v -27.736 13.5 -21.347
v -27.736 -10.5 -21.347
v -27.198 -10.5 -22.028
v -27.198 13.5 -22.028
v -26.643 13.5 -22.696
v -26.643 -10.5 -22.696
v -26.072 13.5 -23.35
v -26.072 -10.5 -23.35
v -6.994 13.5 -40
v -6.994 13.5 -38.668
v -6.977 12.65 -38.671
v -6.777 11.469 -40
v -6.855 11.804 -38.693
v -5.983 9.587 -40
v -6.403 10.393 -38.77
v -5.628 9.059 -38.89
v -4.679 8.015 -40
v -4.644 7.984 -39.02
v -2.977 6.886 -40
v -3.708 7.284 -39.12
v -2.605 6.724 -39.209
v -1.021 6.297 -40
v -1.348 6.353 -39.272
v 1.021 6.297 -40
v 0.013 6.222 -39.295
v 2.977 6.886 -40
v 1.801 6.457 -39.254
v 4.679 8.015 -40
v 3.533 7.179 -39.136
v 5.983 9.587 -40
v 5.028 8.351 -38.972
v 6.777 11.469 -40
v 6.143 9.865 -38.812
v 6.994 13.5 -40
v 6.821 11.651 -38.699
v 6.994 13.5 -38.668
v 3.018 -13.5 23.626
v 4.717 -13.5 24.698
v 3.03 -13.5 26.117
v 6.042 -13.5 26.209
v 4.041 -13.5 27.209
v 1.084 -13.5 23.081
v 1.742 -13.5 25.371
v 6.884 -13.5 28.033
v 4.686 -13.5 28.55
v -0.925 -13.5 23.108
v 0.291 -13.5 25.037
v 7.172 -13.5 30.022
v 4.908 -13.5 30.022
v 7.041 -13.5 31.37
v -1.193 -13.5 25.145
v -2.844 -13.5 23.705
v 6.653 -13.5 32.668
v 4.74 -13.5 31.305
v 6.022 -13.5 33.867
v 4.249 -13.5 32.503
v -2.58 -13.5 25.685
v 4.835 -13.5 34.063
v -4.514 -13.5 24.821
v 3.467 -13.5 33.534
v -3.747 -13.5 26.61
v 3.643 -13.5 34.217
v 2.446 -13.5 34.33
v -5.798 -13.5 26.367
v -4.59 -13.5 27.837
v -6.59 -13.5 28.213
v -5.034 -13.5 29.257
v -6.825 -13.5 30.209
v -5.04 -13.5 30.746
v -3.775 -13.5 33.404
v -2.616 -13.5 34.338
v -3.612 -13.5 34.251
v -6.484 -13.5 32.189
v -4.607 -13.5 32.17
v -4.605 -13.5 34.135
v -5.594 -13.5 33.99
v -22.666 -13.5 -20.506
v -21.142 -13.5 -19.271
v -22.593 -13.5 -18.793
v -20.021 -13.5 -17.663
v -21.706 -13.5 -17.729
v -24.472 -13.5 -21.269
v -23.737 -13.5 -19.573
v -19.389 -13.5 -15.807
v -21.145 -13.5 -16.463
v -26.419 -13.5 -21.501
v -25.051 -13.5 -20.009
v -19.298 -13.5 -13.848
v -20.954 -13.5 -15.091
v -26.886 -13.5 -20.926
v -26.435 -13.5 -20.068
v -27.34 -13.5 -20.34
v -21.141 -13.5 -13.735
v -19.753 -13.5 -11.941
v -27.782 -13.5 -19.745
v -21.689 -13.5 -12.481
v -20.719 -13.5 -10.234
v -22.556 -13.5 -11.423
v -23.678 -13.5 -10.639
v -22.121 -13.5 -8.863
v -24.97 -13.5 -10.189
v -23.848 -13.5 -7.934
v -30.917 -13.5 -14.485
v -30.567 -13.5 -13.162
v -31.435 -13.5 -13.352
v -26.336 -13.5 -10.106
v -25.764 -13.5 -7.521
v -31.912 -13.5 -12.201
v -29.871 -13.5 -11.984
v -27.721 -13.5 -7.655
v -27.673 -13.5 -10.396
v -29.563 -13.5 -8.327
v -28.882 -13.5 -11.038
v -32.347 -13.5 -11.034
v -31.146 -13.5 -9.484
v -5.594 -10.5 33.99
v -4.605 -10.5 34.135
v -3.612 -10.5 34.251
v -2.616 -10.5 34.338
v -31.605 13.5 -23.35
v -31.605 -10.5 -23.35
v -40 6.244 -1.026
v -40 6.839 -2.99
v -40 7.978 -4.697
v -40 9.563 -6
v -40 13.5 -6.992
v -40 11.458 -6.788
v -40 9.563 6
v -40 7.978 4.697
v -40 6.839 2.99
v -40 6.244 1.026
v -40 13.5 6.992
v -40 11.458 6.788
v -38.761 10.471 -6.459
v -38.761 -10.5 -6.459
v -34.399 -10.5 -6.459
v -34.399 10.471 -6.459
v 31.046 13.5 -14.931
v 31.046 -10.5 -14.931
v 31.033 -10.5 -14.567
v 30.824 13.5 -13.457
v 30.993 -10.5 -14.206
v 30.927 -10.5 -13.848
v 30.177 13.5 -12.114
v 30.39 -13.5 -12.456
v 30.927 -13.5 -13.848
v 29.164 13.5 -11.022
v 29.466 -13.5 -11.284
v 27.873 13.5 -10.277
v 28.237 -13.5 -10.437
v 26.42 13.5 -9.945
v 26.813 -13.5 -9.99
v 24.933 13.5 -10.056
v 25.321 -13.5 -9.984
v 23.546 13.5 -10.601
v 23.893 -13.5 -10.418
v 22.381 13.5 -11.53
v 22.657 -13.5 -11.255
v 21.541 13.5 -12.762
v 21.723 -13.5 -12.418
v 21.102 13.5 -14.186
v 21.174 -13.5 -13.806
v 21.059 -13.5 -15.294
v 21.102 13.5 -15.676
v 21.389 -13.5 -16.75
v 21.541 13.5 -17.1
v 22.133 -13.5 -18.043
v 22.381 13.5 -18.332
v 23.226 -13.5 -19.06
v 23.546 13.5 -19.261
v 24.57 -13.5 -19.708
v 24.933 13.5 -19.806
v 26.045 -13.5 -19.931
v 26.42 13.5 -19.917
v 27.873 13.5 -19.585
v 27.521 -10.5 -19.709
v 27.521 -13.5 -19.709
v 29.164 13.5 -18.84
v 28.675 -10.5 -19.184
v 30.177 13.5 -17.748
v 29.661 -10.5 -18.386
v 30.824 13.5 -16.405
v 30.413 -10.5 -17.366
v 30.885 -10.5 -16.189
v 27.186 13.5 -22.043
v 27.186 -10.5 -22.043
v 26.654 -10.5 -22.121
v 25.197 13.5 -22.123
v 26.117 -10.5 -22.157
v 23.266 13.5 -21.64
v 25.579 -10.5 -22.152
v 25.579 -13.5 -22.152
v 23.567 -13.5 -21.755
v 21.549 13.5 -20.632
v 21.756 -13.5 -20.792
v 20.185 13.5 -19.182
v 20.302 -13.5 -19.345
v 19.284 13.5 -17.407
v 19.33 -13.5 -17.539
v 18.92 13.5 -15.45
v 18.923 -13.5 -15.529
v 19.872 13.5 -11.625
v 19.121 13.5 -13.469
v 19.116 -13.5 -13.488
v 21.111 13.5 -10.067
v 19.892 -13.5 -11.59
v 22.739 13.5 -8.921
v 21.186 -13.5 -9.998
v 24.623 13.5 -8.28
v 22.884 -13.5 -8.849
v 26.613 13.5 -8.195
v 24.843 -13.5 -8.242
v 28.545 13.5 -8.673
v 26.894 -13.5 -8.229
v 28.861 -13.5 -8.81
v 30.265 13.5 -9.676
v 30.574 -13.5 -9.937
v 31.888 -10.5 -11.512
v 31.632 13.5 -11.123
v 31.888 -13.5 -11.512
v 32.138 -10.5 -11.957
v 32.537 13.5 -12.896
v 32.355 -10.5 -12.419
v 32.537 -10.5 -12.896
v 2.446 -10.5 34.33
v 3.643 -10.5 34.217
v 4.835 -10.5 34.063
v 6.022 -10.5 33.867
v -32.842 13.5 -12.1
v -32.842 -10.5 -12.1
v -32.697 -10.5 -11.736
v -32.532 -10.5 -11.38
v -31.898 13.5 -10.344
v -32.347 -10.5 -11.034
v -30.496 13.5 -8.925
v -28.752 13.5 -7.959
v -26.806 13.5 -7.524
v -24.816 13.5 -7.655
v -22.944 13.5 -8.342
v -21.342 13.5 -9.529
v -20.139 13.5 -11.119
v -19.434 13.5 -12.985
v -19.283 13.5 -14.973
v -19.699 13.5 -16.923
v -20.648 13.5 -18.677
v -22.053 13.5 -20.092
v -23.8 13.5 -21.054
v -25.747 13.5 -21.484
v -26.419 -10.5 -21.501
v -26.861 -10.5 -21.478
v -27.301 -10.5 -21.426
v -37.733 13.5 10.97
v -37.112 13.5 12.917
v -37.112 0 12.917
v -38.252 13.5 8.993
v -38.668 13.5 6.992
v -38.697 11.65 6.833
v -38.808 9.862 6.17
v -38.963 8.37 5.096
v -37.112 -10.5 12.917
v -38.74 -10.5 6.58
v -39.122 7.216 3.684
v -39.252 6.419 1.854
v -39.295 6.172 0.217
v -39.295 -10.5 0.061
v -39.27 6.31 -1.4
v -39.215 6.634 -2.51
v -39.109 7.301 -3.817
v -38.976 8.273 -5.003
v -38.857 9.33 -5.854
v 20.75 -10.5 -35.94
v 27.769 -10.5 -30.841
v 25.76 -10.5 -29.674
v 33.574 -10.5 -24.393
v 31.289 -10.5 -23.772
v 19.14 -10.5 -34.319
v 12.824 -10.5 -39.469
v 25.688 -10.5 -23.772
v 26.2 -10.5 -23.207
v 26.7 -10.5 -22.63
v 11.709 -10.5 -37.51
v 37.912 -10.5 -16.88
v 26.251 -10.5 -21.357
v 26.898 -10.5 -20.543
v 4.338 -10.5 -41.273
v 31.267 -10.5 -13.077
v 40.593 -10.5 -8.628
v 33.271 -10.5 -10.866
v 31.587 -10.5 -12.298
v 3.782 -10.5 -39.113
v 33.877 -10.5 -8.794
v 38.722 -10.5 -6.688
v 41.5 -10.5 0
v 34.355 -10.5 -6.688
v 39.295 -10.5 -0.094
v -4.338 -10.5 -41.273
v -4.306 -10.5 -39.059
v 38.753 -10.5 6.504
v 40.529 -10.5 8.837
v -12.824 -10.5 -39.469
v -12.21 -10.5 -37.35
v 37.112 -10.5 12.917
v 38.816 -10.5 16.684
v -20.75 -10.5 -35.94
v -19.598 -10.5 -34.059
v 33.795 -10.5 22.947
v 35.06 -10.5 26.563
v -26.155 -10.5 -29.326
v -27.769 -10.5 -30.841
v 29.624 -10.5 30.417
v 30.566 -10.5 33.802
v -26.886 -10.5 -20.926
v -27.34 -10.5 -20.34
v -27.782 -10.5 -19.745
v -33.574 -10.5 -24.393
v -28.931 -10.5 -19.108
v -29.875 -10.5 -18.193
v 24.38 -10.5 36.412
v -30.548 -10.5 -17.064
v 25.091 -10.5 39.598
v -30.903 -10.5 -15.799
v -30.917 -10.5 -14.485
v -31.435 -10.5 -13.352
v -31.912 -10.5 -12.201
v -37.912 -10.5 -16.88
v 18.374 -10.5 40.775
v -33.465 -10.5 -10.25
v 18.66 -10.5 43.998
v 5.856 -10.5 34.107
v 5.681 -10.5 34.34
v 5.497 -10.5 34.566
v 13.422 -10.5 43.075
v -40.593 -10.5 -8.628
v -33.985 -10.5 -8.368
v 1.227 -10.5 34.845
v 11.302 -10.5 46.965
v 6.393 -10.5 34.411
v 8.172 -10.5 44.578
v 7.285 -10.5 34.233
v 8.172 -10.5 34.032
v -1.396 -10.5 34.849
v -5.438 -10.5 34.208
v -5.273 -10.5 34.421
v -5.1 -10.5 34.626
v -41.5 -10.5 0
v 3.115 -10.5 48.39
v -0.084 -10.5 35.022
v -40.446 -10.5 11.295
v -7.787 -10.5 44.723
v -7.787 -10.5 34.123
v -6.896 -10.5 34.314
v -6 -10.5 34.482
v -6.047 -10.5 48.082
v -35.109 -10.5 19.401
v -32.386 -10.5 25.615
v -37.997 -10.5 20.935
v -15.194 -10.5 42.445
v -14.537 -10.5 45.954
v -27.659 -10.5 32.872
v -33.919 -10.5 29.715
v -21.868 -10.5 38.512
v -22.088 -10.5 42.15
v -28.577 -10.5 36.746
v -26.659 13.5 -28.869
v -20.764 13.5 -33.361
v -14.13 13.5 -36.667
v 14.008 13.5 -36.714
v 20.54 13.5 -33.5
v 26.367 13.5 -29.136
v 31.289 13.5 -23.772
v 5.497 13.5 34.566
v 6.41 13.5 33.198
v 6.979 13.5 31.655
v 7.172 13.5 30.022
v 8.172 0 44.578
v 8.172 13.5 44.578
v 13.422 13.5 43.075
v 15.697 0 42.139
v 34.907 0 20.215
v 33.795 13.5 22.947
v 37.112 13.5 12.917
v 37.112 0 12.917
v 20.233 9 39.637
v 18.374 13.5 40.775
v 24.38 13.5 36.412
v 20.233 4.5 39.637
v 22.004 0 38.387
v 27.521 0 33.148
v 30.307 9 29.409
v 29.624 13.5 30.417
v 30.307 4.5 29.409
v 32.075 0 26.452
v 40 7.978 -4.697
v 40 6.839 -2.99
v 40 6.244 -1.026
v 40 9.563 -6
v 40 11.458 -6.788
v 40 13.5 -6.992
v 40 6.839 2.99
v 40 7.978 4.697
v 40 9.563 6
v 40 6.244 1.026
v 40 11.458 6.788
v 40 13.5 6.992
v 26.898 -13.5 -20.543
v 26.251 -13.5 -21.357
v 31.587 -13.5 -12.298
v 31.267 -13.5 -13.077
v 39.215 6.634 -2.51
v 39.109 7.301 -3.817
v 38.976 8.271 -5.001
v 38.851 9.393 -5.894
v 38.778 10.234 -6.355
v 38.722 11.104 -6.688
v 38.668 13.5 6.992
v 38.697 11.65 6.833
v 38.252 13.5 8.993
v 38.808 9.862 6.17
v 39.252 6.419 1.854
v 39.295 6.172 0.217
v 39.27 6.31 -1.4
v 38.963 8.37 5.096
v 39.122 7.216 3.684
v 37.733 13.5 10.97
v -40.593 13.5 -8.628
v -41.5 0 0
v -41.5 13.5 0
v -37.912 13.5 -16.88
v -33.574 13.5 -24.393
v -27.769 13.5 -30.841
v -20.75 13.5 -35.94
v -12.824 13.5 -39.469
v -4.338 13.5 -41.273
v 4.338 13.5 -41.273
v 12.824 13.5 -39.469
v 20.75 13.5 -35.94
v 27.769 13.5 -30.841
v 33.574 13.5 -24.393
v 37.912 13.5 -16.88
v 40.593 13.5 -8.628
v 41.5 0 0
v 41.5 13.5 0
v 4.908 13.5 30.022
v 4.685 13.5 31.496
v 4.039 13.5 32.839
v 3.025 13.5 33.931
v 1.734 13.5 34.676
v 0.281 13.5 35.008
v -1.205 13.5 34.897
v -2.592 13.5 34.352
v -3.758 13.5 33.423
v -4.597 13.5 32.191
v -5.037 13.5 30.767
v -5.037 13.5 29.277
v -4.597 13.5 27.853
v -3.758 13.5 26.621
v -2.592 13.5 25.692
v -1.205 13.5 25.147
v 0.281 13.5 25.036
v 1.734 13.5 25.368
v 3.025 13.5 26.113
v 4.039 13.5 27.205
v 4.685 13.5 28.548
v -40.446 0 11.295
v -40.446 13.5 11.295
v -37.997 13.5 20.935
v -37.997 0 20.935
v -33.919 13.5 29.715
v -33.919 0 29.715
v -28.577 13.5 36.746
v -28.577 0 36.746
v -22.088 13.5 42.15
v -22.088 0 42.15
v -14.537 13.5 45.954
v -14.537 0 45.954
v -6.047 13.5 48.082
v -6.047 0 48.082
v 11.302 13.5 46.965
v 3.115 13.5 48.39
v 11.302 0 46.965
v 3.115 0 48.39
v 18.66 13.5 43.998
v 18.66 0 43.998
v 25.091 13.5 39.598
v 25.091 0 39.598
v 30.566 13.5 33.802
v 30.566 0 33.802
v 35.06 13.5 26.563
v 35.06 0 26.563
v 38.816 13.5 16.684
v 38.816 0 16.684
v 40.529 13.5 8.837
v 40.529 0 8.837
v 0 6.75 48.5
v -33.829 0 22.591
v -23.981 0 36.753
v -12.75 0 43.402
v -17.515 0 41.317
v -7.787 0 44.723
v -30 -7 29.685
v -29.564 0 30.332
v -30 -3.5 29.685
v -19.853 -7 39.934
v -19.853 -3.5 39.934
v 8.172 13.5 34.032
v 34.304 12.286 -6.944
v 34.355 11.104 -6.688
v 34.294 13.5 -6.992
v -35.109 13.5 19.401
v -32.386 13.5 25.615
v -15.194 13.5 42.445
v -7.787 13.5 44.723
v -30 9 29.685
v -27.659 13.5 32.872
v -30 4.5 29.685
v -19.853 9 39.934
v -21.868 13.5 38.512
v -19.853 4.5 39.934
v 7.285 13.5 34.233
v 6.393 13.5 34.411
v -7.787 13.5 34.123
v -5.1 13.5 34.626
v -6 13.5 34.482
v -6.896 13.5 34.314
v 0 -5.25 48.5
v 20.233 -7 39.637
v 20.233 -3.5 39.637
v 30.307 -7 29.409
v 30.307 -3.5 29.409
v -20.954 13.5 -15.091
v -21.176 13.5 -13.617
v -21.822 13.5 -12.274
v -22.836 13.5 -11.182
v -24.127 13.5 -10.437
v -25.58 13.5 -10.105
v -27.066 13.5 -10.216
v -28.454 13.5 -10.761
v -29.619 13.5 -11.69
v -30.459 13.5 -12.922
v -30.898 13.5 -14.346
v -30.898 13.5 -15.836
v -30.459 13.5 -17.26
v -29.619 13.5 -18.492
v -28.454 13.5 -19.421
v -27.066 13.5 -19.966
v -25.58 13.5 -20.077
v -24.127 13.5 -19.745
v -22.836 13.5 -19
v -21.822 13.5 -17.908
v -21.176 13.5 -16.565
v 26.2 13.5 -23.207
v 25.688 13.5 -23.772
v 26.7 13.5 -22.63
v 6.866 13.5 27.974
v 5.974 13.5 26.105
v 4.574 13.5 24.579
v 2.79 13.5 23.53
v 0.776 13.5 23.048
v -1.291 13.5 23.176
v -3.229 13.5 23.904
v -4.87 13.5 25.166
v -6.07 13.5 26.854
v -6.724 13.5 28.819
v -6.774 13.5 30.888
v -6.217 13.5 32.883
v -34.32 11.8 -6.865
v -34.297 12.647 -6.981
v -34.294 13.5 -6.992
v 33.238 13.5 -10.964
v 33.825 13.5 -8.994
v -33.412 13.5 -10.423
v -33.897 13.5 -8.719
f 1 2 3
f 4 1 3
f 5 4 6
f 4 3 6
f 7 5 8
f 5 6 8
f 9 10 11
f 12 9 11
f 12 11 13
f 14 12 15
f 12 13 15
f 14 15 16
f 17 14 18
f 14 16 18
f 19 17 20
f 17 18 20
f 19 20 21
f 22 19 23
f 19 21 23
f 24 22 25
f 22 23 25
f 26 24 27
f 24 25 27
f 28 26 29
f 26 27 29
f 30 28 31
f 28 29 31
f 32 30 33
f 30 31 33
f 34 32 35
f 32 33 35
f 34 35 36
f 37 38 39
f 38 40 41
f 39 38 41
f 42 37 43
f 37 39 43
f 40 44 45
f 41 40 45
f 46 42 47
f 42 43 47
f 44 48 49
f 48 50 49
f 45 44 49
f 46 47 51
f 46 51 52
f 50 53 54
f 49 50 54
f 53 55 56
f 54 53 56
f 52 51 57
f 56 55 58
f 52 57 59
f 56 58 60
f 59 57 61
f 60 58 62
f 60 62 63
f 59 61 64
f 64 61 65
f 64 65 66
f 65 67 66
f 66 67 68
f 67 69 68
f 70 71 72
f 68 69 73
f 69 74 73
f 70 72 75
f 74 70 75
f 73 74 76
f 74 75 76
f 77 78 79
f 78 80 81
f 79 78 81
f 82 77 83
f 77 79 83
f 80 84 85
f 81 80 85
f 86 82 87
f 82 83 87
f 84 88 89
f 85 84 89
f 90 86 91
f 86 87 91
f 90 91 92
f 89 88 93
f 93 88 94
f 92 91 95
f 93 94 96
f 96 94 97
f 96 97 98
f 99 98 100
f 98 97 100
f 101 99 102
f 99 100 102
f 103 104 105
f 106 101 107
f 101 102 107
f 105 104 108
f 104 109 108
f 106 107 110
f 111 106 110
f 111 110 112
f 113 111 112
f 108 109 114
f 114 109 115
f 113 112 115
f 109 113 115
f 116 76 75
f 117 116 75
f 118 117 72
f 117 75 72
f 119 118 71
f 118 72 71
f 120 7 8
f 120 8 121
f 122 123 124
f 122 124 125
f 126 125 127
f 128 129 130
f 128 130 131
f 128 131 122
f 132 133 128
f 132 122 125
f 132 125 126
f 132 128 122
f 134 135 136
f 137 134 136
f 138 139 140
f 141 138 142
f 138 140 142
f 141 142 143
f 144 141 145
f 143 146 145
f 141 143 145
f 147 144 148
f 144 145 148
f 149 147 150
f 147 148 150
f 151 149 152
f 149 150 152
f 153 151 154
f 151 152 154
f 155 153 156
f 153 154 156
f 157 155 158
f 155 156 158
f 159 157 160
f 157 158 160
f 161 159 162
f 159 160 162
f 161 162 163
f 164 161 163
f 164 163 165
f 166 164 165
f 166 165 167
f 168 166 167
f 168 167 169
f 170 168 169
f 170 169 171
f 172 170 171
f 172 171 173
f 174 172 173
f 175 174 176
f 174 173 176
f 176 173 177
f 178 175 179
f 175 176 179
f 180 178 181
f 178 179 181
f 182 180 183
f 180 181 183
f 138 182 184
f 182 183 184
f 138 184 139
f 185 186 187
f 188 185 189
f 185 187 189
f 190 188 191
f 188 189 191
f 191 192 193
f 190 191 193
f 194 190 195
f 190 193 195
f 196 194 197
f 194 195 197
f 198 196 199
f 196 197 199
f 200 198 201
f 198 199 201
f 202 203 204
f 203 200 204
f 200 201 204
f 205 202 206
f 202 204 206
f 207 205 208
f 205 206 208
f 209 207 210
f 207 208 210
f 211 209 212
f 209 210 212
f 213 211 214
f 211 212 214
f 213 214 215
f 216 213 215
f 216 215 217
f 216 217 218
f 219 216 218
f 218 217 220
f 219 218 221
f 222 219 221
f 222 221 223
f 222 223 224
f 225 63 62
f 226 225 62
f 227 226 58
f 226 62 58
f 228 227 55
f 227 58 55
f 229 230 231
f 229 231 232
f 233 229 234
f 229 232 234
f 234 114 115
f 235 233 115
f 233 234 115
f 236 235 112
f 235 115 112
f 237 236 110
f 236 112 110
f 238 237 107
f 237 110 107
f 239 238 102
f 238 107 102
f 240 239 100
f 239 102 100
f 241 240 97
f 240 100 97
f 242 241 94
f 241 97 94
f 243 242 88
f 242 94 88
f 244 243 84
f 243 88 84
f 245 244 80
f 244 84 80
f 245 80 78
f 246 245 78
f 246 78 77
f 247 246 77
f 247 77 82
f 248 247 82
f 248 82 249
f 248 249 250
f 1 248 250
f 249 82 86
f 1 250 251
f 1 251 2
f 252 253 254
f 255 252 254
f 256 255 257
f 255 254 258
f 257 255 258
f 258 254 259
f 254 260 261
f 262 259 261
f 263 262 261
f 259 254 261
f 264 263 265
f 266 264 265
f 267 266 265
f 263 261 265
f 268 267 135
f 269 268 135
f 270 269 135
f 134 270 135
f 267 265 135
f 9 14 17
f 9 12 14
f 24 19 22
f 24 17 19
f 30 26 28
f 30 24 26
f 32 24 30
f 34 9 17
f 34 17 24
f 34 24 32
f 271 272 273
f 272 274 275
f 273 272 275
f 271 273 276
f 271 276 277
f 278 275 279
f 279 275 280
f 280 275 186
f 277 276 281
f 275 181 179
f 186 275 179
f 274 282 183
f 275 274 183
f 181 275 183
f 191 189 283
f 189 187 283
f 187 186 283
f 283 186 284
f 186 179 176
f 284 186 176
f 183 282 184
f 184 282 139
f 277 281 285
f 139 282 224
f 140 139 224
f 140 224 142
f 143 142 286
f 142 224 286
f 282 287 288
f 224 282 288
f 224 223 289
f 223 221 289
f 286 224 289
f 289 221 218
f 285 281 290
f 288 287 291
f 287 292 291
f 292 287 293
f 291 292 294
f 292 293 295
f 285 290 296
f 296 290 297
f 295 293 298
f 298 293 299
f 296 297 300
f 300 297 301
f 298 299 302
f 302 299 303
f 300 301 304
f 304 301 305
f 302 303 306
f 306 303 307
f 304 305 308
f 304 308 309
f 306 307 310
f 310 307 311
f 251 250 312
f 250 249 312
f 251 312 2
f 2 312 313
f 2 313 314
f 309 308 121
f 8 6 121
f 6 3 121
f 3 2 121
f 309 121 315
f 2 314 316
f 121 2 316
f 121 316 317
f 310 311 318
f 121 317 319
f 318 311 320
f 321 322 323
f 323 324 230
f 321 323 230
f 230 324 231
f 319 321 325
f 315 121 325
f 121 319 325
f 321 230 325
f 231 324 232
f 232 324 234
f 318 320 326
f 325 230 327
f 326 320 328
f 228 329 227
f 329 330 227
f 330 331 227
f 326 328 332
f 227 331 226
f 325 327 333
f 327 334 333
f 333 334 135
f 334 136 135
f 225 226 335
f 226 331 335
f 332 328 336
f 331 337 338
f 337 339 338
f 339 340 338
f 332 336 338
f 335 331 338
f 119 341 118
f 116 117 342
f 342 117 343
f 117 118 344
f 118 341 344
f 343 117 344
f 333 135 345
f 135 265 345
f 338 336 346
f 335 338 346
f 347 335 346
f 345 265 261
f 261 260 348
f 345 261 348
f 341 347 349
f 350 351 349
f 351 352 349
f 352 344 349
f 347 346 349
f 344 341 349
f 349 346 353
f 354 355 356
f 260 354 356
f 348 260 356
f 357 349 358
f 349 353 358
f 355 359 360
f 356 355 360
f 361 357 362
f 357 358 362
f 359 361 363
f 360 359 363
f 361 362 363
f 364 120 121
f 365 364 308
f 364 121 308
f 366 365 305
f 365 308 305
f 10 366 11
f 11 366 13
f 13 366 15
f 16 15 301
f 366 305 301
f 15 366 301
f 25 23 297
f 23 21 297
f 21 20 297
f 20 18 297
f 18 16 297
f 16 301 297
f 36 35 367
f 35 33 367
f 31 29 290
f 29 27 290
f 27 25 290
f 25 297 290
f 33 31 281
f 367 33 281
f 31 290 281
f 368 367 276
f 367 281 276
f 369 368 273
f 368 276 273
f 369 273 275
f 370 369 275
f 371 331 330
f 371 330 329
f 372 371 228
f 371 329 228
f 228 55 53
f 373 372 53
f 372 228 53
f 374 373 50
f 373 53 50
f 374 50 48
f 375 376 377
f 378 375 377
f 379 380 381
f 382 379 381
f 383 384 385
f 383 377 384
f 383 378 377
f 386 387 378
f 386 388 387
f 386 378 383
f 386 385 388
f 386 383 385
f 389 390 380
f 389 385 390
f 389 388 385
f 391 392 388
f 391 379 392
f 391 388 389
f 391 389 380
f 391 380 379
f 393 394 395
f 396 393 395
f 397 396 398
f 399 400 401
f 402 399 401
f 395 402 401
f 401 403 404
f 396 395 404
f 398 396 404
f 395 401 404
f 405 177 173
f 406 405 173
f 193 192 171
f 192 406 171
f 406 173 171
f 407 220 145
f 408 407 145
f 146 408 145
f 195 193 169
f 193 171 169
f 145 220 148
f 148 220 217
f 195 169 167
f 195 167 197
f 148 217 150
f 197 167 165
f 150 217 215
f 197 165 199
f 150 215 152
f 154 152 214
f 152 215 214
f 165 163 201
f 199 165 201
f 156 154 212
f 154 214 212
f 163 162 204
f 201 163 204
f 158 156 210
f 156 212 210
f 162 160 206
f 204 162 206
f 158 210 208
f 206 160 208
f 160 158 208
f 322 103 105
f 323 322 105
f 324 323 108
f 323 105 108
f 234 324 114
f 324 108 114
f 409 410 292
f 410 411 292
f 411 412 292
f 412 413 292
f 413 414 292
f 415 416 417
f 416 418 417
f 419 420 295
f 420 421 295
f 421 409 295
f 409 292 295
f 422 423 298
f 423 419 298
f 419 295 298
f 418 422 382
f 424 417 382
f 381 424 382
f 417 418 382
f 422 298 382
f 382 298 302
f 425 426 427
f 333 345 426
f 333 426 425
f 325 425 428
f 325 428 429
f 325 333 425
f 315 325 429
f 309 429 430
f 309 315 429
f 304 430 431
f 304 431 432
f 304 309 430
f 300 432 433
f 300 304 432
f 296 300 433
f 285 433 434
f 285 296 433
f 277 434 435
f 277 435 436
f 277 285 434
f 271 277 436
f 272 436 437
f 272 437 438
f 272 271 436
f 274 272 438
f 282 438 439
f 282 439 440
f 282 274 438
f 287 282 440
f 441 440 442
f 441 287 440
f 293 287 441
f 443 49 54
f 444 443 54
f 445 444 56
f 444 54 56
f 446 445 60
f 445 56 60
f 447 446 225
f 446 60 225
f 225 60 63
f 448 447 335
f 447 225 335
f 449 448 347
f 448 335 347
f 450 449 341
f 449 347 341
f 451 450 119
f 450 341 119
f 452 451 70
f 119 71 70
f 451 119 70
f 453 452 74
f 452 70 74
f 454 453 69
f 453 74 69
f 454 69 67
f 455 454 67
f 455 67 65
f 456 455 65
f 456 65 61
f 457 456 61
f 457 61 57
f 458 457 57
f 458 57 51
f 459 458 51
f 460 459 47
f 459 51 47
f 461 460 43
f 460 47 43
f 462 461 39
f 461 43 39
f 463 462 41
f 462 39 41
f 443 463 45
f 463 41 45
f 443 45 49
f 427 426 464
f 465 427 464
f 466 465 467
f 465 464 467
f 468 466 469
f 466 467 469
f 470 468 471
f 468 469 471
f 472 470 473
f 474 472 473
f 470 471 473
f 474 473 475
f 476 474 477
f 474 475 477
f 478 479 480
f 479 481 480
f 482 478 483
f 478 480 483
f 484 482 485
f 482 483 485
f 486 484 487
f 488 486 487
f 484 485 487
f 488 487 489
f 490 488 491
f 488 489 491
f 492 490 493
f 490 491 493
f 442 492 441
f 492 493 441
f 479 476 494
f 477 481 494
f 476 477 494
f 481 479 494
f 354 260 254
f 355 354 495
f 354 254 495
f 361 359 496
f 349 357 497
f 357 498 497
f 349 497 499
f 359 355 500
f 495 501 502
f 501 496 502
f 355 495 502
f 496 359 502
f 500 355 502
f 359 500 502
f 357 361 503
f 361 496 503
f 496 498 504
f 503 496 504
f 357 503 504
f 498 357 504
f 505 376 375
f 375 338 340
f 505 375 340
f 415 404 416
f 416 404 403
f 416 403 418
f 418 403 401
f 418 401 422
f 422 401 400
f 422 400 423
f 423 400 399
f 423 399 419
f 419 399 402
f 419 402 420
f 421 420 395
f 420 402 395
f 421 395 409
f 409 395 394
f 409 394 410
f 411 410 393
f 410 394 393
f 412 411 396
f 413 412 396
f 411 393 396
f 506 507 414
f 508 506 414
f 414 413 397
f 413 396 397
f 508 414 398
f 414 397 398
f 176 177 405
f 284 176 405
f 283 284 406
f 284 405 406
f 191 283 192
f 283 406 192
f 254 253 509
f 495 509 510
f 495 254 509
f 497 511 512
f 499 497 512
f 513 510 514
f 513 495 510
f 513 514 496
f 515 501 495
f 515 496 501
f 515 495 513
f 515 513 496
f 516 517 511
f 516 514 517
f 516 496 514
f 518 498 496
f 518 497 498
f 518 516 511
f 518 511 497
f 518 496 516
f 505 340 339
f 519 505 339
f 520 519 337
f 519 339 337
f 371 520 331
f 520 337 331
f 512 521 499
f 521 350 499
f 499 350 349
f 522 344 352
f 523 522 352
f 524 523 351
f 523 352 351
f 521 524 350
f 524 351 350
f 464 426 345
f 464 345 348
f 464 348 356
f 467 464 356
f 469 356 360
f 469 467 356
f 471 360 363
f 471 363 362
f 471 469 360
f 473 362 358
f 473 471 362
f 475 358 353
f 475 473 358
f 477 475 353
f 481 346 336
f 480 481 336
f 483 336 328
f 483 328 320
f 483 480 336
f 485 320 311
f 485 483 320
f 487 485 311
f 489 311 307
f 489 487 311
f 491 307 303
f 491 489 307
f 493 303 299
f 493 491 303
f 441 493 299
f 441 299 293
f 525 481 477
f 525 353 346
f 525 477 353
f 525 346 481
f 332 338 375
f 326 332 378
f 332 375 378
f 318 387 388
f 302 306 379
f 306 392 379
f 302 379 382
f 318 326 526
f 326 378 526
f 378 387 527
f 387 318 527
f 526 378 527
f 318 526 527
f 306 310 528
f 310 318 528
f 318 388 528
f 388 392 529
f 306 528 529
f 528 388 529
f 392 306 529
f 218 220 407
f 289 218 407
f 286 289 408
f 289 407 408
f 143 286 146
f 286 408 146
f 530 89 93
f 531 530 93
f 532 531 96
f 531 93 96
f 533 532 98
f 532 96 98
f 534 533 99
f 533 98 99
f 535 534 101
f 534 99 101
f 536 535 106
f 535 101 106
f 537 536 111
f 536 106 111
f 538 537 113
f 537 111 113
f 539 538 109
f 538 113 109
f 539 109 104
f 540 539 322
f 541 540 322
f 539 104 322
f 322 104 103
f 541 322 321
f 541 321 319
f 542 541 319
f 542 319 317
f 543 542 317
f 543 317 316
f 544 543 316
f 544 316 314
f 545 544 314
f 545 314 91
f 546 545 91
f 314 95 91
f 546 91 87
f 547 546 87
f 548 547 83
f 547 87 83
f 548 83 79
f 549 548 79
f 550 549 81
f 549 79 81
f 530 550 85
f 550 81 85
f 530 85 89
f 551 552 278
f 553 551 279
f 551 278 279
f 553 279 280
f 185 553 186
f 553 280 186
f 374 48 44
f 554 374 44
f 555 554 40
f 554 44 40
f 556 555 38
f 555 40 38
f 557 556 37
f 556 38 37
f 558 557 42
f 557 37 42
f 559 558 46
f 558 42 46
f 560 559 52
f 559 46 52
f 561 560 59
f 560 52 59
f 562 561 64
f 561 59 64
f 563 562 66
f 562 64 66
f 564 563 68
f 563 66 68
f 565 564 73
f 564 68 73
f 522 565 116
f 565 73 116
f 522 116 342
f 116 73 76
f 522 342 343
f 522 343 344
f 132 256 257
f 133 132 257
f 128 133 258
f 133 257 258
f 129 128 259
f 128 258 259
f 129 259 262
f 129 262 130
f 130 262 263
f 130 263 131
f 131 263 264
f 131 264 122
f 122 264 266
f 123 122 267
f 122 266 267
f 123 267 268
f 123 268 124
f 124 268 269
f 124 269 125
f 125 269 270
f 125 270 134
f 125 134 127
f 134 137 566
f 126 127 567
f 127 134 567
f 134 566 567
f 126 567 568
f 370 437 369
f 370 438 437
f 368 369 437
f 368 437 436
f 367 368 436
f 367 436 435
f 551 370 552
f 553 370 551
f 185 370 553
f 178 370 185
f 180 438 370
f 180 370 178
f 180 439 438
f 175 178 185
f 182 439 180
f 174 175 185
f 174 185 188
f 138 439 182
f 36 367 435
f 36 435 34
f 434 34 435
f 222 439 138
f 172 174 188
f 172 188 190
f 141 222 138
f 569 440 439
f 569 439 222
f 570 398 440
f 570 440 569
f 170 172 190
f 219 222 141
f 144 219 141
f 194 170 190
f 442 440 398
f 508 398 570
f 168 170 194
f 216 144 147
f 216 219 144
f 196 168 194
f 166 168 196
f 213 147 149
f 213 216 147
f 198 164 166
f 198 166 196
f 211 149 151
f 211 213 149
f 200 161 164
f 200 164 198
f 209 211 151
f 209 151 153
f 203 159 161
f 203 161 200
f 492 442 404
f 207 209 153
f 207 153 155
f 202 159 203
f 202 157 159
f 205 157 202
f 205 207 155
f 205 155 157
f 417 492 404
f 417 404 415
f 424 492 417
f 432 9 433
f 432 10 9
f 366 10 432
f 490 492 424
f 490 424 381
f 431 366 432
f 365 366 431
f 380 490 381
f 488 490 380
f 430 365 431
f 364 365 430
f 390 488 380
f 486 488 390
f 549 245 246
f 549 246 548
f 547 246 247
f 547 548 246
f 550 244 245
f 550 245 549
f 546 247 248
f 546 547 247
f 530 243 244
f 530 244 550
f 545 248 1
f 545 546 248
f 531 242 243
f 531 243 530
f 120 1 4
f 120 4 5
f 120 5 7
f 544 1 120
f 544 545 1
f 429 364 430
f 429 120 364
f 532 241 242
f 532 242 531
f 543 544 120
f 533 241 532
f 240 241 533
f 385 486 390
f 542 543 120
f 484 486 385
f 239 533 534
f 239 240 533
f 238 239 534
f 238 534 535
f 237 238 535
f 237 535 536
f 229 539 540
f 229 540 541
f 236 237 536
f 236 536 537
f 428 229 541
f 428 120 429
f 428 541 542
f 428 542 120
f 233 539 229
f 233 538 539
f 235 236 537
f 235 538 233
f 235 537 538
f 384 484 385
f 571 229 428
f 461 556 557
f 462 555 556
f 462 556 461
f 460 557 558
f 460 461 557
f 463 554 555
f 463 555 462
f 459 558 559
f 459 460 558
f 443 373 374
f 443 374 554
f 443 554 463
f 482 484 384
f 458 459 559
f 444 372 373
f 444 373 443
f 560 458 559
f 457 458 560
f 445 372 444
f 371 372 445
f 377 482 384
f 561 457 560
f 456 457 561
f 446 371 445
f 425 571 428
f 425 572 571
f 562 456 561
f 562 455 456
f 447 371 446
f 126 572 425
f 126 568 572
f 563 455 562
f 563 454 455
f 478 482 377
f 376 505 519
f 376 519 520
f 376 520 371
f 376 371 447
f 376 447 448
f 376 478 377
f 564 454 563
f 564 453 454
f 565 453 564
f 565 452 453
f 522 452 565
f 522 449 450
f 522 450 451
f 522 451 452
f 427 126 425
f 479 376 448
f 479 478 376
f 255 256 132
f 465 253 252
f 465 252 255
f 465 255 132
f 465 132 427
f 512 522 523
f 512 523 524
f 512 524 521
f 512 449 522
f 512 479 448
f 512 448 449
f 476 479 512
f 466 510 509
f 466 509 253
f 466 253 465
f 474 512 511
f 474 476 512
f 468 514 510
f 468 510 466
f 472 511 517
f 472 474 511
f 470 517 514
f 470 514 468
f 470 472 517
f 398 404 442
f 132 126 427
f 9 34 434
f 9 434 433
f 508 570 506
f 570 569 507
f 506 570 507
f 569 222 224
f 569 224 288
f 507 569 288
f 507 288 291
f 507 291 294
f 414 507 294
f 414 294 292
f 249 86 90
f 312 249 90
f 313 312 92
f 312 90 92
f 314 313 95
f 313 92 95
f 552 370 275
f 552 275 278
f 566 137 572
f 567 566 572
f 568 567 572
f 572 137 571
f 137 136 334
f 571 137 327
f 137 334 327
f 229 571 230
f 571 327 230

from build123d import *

# Parameters (mm, degrees)
F1_DEPTH  = 13.5
F3_DEPTH  = 30
F5_DEPTH  = 3
F7_D      = 10
F8_R      = 7
F9_DEPTH  = 40
F10_R     = 7
F11_DEPTH = 40
F13_DEPTH = 45


with BuildPart() as f1:
    # F0 (on Front) → F1 (new body, symmetric)
    with BuildSketch(Plane.XZ):
        with BuildLine():
            add(Edge.make_bspline(
                [(-41.5, 0), (-40.6509190798, 35.0818894804), (0.6570294499, 61.9181105196), (39.3368601799, 35.0818894804), (41.5, 0)],
                knots=[0, 0, 0, 0, 0.5, 1, 1, 1, 1], degree=3))
            ThreePointArc((-41.5, 0), (0, -41.5), (41.5, 0))
        make_face()
    extrude(amount=F1_DEPTH, both=True)

    # F2 (on face) → F3 (cut)
    with BuildSketch(Plane.XZ.offset(13.5)):
        with BuildLine():
            ThreePointArc((32.5374414571, -12.8963135596), (34.3788485191, -6.5646610347), (35, 0))
            ThreePointArc((35, 0), (26.6213074089, 22.7223676548), (5.4968004663, 34.5656648227))
            ThreePointArc((5.4968004663, 34.5656648227), (6.7399251447, 32.4431879402), (7.1720870792, 30.021720793))
            ThreePointArc((7.1720870792, 30.021720793), (-2.286987081, 23.4678704533), (-5.1001855708, 34.6264076558))
            ThreePointArc((-5.1001855708, 34.6264076558), (-30.0956422284, 17.8676332753), (-32.8417131072, -12.1004909067))
            ThreePointArc((-32.8417131072, -12.1004909067), (-25.0470149854, -7.6099732464), (-19.2668672949, -14.5028652623))
            ThreePointArc((-19.2668672949, -14.5028652623), (-21.8672756585, -19.947458308), (-27.7364654185, -21.3468612702))
            ThreePointArc((-27.7364654185, -21.3468612702), (-0.4437125722, -34.9971873035), (27.186343602, -22.0432012547))
            ThreePointArc((27.186343602, -22.0432012547), (19.8715130661, -11.6252013242), (32.5374414571, -12.8963135596))
        make_face()
    extrude(amount=-F3_DEPTH, mode=Mode.SUBTRACT)

    # F4 (on face) → F5 (cut)
    with BuildSketch(Plane.XZ.offset(13.5)):
        with BuildLine():
            add(Edge.make_bspline(
                [(-41.5, 0), (-40.6509190798, 35.0818894804), (0.6570294499, 61.9181105196), (39.3368601799, 35.0818894804), (41.5, 0)],
                knots=[0, 0, 0, 0, 0.5, 1, 1, 1, 1], degree=3))
            ThreePointArc((-41.5, 0), (0, -41.5), (41.5, 0))
        make_face()
        with BuildLine():
            ThreePointArc((-5.5944102498, 33.9900338545), (0.2188459884, 34.4261095338), (6.02153387, 33.8667139323))
            ThreePointArc((6.02153387, 33.8667139323), (5.7700864546, 34.2243869697), (5.4968004663, 34.5656648227))
            ThreePointArc((5.4968004663, 34.5656648227), (30.4107010386, 17.3259707474), (32.5374414571, -12.8963135596))
            ThreePointArc((32.5374414571, -12.8963135596), (32.2505420404, -12.1862967222), (31.8878008438, -11.5118680686))
            ThreePointArc((31.8878008438, -11.5118680686), (29.2191511765, -17.1200357859), (25.5785678665, -22.1518733584))
            ThreePointArc((25.5785678665, -22.1518733584), (26.3855932866, -22.1439565844), (27.186343602, -22.0432012547))
            ThreePointArc((27.186343602, -22.0432012547), (-0.4437125722, -34.9971873035), (-27.7364654185, -21.3468612702))
            ThreePointArc((-27.7364654185, -21.3468612702), (-27.0814923312, -21.4553026803), (-26.4191917867, -21.5012077267))
            ThreePointArc((-26.4191917867, -21.5012077267), (-29.8477517846, -16.5307845373), (-32.3469371921, -11.0340398062))
            ThreePointArc((-32.3469371921, -11.0340398062), (-32.6167533089, -11.5568598976), (-32.8417131072, -12.1004909067))
            ThreePointArc((-32.8417131072, -12.1004909067), (-30.0956422284, 17.8676332753), (-5.1001855708, 34.6264076558))
            ThreePointArc((-5.1001855708, 34.6264076558), (-5.3564618775, 34.3153377337), (-5.5944102498, 33.9900338545))
        make_face(mode=Mode.SUBTRACT)
    extrude(amount=-F5_DEPTH, mode=Mode.SUBTRACT)

    # F7 (through all)
    with Locations(Plane(origin=(0, 13.5, 0), x_dir=(-1, 0, 0), z_dir=(0, 1, 0))):
        with Locations((0.0923887911, 30.0220718413), (-26.0460712844, -14.9310248805), (25.9536824933, -15.0910469608)):
            Hole(F7_D / 2)

    # F8 (on Top) → F9 (cut)
    with BuildSketch(Plane.XY):
        with Locations((0, 13.2217486843)):
            Circle(F8_R)
    extrude(amount=-F9_DEPTH, mode=Mode.SUBTRACT)

    # F10 (on Right) → F11 (cut, symmetric)
    with BuildSketch(Plane.YZ):
        with Locations((13.1687597471, 0)):
            Circle(F10_R)
    extrude(amount=F11_DEPTH, both=True, mode=Mode.SUBTRACT)

    # F12 (on Front) → F13 (cut, symmetric)
    with BuildSketch(Plane.XZ):
        with BuildLine():
            add(Edge.make_bspline(
                [(-37.1117404138, 12.9166683182), (-31.8909446924, 33.2991668752), (-20.4388675878, 42.310272007), (-7.7872653969, 44.7230026175)],
                knots=[0, 0, 0, 0, 0.415839322, 0.415839322, 0.415839322, 0.415839322], degree=3))
            ThreePointArc((-37.1117404138, 12.9166683182), (-39.1537586618, 3.332383477), (-38.7608190529, -6.4591410676))
            Line((-38.7608190529, -6.4591410676), (-17.4803026021, -6.4591410676))
            Line((-17.4803026021, -6.4591410676), (-17.4803026021, -23.350475356))
            Line((-17.4803026021, -23.350475356), (-31.6050138053, -23.350475356))
            ThreePointArc((-31.6050138053, -23.350475356), (-0.2633451611, -39.2944302199), (31.2892064192, -23.77198264))
            Line((31.2892064192, -23.77198264), (17.6453739405, -23.77198264))
            Line((17.6453739405, -23.77198264), (17.6453739405, -6.6884830925))
            Line((17.6453739405, -6.6884830925), (38.7219032449, -6.6884830925))
            ThreePointArc((38.7219032449, -6.6884830925), (39.1634506664, 3.2164777144), (37.1117404138, 12.9166683182))
            add(Edge.make_bspline(
                [(8.172452372, 44.5784830349), (20.7986586816, 41.9557269194), (32.3701441874, 32.8654666183), (37.1117404138, 12.9166683182)],
                knots=[0.5879451924, 0.5879451924, 0.5879451924, 0.5879451924, 1, 1, 1, 1], degree=3))
            Line((8.172452372, 44.5784830349), (8.172452372, 21.7333426662))
            Line((8.172452372, 21.7333426662), (-7.7872653969, 21.7333426662))
            Line((-7.7872653969, 21.7333426662), (-7.7872653969, 44.7230026175))
        make_face()
    extrude(amount=F13_DEPTH, both=True, mode=Mode.SUBTRACT)


solid = f1.part
